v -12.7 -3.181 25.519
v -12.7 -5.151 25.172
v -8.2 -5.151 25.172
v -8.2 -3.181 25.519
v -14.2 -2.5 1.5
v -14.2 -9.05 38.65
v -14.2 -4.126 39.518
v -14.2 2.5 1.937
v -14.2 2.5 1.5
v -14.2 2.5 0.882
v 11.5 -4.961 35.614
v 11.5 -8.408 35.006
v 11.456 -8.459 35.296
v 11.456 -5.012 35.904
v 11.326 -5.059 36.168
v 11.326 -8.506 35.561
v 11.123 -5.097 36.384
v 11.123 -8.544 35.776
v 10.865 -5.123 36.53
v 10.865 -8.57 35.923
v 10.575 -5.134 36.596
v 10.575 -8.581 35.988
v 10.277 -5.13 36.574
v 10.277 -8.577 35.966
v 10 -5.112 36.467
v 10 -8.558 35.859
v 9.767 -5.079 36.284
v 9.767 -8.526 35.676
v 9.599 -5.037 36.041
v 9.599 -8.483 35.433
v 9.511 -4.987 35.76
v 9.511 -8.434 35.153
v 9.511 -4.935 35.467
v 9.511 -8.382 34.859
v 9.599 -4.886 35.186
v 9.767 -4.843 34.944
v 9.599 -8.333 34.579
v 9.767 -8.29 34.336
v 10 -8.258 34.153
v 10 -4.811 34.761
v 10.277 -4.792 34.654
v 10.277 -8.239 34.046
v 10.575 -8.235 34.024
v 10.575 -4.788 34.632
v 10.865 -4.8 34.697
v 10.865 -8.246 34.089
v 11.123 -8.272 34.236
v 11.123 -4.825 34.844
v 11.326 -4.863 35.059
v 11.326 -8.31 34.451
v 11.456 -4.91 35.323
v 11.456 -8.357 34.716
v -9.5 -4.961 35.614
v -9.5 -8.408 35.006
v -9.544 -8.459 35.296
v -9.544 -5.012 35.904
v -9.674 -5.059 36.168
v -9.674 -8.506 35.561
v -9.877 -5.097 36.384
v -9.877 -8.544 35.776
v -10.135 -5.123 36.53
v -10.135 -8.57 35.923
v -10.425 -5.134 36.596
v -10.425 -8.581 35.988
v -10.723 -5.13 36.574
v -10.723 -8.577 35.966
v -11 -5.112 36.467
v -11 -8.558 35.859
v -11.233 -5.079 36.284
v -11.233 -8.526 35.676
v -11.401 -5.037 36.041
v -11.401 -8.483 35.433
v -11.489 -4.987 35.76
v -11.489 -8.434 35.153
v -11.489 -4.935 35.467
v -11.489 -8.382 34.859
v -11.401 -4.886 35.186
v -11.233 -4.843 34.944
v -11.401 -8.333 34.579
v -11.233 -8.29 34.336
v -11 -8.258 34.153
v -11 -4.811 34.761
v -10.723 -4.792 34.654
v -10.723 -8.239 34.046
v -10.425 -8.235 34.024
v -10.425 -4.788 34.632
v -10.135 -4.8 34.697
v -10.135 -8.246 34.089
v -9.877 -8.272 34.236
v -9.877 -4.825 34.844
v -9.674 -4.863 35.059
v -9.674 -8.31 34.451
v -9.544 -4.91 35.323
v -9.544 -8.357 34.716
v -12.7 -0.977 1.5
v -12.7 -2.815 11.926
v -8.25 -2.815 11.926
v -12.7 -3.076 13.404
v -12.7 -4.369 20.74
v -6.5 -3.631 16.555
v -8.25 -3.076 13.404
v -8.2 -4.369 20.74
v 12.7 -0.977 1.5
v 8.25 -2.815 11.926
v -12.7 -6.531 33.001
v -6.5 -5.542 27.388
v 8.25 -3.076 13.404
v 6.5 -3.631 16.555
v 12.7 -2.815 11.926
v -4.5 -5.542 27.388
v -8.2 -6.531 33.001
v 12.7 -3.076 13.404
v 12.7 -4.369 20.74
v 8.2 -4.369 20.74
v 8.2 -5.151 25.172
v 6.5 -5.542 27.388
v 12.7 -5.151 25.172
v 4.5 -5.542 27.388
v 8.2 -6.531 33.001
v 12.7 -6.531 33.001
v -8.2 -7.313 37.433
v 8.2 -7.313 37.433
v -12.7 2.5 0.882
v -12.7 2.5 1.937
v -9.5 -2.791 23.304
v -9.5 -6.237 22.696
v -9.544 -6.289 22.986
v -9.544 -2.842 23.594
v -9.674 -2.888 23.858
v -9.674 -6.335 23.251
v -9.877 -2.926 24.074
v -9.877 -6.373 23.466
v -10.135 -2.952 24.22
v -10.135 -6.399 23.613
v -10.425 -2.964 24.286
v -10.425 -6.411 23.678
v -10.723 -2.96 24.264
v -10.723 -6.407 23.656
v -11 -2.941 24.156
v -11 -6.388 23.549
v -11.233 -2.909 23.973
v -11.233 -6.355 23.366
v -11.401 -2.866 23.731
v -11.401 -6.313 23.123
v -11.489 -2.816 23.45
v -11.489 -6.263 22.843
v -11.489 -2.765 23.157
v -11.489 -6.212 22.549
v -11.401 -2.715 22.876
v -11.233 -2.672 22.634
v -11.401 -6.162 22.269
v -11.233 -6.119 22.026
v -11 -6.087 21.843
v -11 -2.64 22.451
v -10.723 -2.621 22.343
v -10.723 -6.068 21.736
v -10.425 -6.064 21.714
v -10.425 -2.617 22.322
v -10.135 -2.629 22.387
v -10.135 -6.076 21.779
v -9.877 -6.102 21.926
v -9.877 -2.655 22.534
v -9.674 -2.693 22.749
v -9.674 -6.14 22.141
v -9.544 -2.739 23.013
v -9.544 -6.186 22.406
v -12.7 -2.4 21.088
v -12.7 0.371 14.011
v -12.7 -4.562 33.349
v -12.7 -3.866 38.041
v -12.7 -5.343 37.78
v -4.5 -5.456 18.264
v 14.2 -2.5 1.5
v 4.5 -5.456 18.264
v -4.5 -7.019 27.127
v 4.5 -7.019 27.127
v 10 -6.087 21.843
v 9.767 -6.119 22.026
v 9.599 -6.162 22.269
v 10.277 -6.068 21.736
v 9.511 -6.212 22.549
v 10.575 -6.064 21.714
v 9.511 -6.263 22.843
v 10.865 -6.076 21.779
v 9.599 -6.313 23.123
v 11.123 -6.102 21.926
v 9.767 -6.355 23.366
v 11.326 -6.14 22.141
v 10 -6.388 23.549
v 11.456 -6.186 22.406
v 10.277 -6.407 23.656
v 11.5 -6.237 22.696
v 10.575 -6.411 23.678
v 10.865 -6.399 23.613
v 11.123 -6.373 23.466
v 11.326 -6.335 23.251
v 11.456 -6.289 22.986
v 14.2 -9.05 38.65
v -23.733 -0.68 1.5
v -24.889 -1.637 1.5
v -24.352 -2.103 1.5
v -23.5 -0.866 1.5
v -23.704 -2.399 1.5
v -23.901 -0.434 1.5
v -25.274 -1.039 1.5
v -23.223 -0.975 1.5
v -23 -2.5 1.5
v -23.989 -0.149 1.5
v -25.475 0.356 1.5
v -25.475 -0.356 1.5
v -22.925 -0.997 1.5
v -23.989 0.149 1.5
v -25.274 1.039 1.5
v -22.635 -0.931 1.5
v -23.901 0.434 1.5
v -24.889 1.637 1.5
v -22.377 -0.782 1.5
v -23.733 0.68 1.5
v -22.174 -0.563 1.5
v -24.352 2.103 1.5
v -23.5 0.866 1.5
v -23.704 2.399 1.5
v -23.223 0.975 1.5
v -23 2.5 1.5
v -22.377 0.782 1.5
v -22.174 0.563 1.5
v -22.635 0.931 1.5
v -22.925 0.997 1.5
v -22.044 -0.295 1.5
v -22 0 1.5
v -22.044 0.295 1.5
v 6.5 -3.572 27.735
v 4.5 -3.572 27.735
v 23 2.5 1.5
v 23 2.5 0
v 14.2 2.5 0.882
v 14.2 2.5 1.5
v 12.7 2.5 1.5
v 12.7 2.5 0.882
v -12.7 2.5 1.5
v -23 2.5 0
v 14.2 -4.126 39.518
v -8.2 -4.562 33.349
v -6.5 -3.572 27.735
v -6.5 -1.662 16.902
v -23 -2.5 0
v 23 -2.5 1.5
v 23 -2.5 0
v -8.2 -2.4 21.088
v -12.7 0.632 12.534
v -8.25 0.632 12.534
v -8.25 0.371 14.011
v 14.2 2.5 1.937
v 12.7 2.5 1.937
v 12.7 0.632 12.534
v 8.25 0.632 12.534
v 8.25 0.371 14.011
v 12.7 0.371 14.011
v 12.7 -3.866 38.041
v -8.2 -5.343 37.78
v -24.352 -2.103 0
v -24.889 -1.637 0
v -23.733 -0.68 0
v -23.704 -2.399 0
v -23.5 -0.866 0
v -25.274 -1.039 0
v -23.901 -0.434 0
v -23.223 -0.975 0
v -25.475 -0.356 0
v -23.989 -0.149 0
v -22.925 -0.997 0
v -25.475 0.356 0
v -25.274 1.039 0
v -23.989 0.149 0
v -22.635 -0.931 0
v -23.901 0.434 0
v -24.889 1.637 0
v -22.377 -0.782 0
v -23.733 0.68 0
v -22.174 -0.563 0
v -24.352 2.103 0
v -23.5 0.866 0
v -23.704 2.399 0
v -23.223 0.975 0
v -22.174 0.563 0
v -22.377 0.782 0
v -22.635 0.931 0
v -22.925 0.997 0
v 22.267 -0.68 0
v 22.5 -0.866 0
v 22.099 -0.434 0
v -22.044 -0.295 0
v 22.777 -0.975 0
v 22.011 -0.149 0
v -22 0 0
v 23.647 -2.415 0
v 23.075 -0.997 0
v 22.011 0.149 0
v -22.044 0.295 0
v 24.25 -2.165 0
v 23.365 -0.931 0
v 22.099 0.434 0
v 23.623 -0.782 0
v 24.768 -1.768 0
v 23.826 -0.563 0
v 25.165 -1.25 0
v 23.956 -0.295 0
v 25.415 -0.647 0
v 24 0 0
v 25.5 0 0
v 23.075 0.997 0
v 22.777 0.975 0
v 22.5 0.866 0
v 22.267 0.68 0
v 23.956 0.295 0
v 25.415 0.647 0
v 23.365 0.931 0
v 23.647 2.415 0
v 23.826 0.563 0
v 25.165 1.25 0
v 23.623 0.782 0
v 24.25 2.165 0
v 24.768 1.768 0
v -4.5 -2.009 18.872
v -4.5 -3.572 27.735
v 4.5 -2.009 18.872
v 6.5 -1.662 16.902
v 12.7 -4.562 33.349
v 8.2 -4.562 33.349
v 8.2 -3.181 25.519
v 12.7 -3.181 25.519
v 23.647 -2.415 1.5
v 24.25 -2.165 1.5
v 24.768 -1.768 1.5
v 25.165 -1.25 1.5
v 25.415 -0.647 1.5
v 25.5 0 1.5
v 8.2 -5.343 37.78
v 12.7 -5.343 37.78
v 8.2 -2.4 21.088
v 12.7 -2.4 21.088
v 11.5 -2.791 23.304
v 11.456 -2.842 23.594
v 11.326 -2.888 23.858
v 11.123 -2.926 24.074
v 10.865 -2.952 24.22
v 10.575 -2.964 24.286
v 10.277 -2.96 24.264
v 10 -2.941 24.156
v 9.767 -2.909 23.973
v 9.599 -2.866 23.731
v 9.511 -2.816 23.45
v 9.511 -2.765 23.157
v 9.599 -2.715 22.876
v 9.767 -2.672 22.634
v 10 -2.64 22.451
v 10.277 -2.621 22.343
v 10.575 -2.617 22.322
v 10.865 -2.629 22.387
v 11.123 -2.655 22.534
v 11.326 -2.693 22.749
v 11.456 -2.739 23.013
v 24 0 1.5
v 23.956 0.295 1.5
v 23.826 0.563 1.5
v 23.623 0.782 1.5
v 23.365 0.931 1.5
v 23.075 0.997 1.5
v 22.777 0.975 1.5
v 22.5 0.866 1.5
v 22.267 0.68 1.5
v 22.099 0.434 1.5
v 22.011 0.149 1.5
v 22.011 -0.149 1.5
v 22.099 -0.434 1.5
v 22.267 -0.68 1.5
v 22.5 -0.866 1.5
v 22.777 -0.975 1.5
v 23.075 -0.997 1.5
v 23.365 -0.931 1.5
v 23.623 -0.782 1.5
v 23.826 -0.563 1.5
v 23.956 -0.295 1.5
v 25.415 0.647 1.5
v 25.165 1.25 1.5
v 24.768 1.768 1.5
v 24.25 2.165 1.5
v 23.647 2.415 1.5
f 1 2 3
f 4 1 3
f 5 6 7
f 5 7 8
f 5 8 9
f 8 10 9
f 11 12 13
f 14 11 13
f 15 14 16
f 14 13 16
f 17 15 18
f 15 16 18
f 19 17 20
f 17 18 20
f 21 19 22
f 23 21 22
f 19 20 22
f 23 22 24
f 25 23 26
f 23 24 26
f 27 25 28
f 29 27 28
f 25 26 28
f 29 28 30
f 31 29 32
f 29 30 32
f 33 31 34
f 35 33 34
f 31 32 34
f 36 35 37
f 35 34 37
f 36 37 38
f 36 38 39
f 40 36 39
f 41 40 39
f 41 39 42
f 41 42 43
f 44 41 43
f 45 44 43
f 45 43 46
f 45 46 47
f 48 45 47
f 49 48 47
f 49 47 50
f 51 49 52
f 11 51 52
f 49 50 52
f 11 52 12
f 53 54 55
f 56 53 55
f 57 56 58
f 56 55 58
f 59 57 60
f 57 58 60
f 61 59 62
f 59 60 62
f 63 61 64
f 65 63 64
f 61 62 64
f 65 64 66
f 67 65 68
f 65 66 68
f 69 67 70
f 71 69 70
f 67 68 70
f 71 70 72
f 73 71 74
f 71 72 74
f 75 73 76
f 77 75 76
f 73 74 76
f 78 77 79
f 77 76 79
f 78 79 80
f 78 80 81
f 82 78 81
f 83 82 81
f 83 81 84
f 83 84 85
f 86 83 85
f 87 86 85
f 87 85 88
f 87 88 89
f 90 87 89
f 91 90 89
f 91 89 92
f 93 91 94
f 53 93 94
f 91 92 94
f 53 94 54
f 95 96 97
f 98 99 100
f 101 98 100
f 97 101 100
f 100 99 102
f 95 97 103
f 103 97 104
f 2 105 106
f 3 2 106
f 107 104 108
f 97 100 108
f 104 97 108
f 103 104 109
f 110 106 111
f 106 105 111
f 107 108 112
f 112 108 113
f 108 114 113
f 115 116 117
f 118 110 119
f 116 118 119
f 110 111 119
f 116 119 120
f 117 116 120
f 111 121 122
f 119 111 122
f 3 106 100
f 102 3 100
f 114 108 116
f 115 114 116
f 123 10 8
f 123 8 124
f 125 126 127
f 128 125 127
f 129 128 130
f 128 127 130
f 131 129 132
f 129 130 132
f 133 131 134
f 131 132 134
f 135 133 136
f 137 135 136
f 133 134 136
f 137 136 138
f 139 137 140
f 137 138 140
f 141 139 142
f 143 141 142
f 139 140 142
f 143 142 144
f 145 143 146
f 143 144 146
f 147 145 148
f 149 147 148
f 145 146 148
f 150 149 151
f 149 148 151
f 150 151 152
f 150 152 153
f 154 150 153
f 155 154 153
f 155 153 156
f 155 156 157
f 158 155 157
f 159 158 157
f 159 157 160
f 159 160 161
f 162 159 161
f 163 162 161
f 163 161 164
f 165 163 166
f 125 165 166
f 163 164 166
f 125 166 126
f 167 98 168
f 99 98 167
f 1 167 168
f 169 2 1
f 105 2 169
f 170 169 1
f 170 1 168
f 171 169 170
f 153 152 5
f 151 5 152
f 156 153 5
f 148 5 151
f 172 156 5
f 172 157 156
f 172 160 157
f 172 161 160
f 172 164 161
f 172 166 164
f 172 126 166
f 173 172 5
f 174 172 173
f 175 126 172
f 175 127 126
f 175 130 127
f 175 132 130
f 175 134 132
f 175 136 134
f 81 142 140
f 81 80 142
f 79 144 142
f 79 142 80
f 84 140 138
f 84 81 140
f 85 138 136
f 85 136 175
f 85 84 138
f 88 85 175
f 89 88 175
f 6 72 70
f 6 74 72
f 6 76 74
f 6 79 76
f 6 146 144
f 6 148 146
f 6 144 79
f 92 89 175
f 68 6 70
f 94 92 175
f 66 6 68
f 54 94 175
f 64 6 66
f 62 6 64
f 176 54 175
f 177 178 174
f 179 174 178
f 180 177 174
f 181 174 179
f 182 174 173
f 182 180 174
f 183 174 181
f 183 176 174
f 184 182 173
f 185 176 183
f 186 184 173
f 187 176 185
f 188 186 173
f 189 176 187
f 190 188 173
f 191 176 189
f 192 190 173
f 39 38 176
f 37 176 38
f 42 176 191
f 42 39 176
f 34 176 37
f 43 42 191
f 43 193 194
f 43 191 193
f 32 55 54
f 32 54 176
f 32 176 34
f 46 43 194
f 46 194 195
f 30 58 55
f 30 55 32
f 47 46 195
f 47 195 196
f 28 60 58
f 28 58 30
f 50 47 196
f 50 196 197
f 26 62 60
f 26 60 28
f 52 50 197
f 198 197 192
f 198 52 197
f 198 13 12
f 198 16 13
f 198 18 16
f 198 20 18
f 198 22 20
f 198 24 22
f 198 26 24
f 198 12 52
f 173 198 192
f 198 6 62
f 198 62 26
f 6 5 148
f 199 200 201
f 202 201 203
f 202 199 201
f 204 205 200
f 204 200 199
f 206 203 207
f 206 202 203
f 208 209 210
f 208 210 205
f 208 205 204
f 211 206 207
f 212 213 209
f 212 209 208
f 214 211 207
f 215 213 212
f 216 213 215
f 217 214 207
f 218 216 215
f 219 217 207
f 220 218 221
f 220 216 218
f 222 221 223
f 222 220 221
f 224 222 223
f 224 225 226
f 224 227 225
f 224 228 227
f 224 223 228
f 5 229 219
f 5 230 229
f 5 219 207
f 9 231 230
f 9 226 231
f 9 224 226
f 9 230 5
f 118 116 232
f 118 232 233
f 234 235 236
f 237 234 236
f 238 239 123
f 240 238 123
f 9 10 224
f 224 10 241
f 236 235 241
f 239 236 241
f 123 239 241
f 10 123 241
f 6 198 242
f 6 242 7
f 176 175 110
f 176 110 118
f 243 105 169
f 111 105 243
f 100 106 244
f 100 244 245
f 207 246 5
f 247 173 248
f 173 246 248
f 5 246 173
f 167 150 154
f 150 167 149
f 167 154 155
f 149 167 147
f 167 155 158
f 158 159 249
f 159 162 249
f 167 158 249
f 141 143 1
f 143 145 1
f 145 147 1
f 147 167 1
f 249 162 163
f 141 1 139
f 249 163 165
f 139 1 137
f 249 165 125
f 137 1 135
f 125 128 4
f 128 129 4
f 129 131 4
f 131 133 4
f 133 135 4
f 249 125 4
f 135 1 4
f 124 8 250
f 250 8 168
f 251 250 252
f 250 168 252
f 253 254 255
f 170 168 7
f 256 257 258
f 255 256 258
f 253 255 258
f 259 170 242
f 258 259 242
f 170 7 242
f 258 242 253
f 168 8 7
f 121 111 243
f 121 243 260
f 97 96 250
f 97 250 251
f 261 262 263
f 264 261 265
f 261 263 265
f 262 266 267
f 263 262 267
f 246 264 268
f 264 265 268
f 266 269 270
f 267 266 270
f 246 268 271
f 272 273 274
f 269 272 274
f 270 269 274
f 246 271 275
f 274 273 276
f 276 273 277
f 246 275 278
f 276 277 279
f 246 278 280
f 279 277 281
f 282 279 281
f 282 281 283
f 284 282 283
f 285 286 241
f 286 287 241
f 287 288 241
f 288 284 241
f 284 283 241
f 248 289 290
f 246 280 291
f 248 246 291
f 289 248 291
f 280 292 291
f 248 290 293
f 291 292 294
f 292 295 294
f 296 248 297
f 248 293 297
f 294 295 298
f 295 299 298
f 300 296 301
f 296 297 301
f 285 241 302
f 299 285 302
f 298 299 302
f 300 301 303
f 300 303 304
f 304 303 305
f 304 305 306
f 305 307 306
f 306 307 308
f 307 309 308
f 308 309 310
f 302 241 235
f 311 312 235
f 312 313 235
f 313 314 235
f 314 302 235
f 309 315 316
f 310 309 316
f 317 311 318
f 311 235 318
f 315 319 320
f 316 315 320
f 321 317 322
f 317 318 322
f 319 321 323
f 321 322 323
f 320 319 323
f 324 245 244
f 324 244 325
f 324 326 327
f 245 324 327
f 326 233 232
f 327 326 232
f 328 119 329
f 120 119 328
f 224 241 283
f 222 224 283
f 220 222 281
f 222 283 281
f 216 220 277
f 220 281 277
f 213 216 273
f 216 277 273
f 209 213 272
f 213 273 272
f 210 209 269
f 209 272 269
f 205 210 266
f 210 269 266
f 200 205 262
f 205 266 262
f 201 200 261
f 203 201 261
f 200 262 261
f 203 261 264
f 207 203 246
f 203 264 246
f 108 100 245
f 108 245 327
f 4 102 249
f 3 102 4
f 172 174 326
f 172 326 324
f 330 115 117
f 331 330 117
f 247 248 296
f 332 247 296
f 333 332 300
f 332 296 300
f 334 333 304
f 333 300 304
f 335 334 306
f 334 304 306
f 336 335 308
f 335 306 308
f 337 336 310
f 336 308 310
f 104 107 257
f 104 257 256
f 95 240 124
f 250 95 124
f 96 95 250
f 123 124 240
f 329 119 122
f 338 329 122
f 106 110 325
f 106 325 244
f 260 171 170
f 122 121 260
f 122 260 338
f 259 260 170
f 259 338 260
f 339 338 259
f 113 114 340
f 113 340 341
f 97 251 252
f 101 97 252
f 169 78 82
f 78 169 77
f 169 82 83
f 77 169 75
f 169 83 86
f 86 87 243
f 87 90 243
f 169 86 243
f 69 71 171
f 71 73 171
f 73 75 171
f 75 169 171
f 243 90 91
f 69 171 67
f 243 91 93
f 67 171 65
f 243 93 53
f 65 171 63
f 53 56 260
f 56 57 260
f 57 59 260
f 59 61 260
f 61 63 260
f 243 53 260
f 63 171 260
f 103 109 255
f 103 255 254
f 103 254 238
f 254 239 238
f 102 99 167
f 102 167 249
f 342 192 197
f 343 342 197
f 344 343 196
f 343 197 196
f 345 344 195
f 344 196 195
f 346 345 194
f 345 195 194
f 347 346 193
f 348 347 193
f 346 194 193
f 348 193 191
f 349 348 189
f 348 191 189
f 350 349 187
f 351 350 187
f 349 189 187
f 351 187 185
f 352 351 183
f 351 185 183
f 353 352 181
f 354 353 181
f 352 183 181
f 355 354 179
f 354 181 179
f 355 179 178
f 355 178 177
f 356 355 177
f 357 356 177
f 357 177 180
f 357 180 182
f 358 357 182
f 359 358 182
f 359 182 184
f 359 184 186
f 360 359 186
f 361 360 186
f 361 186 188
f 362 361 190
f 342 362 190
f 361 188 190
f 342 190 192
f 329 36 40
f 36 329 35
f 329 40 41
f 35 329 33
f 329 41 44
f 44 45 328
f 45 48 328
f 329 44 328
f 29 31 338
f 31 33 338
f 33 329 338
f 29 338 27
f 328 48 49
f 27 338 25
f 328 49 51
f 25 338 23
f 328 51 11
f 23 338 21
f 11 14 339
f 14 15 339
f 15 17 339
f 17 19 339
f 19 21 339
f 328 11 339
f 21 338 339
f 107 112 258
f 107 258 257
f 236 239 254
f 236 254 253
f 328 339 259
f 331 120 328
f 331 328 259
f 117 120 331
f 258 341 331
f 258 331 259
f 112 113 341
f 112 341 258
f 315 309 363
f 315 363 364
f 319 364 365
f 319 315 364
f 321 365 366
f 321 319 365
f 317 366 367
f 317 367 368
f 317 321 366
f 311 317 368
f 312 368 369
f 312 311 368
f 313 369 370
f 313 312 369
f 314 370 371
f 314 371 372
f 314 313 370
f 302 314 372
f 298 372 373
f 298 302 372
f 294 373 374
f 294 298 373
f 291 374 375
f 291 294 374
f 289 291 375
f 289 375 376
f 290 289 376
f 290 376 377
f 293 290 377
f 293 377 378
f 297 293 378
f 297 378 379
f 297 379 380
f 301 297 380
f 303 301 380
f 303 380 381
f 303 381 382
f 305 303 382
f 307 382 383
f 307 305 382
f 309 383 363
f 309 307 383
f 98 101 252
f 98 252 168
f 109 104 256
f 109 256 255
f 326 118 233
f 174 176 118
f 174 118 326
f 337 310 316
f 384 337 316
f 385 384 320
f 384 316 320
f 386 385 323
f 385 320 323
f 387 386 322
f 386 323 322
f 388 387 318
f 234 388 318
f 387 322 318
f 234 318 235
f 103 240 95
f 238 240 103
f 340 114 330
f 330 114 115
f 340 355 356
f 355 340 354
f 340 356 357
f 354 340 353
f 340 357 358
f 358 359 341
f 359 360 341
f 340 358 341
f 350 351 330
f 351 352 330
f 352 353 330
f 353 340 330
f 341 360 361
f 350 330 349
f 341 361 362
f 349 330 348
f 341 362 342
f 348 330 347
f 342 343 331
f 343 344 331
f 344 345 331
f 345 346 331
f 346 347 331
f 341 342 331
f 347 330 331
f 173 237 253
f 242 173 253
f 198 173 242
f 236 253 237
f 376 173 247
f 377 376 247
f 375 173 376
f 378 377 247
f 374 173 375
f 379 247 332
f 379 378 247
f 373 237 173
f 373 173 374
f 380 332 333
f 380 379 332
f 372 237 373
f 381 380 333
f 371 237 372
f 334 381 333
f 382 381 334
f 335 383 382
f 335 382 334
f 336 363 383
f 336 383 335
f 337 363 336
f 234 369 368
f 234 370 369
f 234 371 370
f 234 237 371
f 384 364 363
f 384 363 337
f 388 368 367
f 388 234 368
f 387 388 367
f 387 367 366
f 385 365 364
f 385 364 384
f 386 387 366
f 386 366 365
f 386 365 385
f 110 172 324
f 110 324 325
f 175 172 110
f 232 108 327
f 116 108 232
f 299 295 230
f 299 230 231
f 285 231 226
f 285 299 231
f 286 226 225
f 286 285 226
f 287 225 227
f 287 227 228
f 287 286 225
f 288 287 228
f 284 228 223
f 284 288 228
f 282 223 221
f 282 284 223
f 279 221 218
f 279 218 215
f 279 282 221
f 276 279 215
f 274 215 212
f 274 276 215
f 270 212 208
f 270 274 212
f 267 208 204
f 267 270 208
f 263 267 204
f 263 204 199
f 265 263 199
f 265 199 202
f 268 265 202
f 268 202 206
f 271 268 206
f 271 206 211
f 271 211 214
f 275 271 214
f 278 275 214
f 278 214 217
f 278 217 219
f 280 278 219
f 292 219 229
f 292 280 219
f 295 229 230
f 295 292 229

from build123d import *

# Parameters (mm, degrees)
F0_R     = 1
F1_DEPTH = 1.5
F4_DEPTH = 1.5
F5_DEPTH = 5
F3_W     = 4.5
F3_H     = 4.5
F3_R     = 1
F6_DEPTH = 3.5
F7_W     = 32.583123
F7_H     = 2.642157
F8_DEPTH = 14.8


with BuildPart() as f1:
    # F0 (on Top) → F1 (new body)
    with BuildSketch(Plane.XY):
        with BuildLine():
            ThreePointArc((-20.5, 0), (-21.232233, 1.767767), (-23, 2.5))
            ThreePointArc((-23, 2.5), (-25.5, 0), (-23, -2.5))
            ThreePointArc((-23, -2.5), (-21.232233, -1.767767), (-20.5, 0))
        make_face()
        with Locations((-23, 0)):
            Circle(F0_R, mode=Mode.SUBTRACT)
        with BuildLine():
            Line((23, 2.5), (-23, 2.5))
            ThreePointArc((-23, 2.5), (-21.232233, 1.767767), (-20.5, 0))
            ThreePointArc((-20.5, 0), (-21.232233, -1.767767), (-23, -2.5))
            Line((-23, -2.5), (23, -2.5))
            ThreePointArc((23, -2.5), (20.5, 0), (23, 2.5))
        make_face()
        with BuildLine():
            ThreePointArc((25.5, 0), (24.767767, 1.767767), (23, 2.5))
            ThreePointArc((23, 2.5), (20.5, 0), (23, -2.5))
            ThreePointArc((23, -2.5), (24.767767, -1.767767), (25.5, 0))
        make_face()
        with Locations((23, 0)):
            Circle(F0_R, mode=Mode.SUBTRACT)
    extrude(amount=F1_DEPTH)

    # F3 (on face) → F4 (join)
    with BuildSketch(Plane(origin=(0, -2.168101, -0.382295), x_dir=(1, 0, 0), z_dir=(0, -0.984808, -0.173648))):
        Polygon((8.2, 38.13412), (-8.2, 38.13412), (-8.2, 33.63412), (-12.7, 33.63412), (-12.7, 25.68412), (-8.2, 25.68412), (-8.2, 21.18412), (-12.7, 21.18412), (-12.7, 13.73412), (-8.25, 13.73412), (-8.25, 12.23412), (-12.7, 12.23412), (-12.7, 0.43412), (12.7, 0.43412), (12.7, 12.23412), (8.25, 12.23412), (8.25, 13.73412), (12.7, 13.73412), (12.7, 21.18412), (8.2, 21.18412), (8.2, 25.68412), (12.7, 25.68412), (12.7, 33.63412), (8.2, 33.63412), align=None)
        Polygon((-6.5, 27.93412), (-4.5, 27.93412), (4.5, 27.93412), (6.5, 27.93412), (6.5, 16.93412), (-6.5, 16.93412), align=None, mode=Mode.SUBTRACT)
    extrude(amount=-F4_DEPTH)

    # F3 (on face) → F5 (join)
    with BuildSketch(Plane(origin=(0, -2.168101, -0.382295), x_dir=(1, 0, 0), z_dir=(0, -0.984808, -0.173648))):
        Polygon((-12.7, 33.63412), (-12.7, 38.13412), (-8.2, 38.13412), (8.2, 38.13412), (12.7, 38.13412), (12.7, 33.63412), (12.7, 25.68412), (12.7, 21.18412), (12.7, 13.73412), (8.25, 13.73412), (8.25, 12.23412), (12.7, 12.23412), (12.7, 0.43412), (14.2, 0.43412), (14.2, 39.63412), (-14.2, 39.63412), (-14.2, 0.43412), (-12.7, 0.43412), (-12.7, 12.23412), (-8.25, 12.23412), (-8.25, 13.73412), (-12.7, 13.73412), (-12.7, 21.18412), (-12.7, 25.68412), align=None)
    extrude(amount=-F5_DEPTH)

    # F3 (on face) → F6 (join)
    with BuildSketch(Plane(origin=(0, -2.168101, -0.382295), x_dir=(1, 0, 0), z_dir=(0, -0.984808, -0.173648))):
        with Locations((-10.45, 35.88412)):
            Rectangle(F3_W, F3_H)
        with Locations((-10.5, 35.93412)):
            Circle(F3_R, mode=Mode.SUBTRACT)
        with Locations((10.45, 35.88412)):
            Rectangle(F3_W, F3_H)
        with Locations((10.5, 35.93412)):
            Circle(F3_R, mode=Mode.SUBTRACT)
        with Locations((10.45, 23.43412)):
            Rectangle(F3_W, F3_H)
        with Locations((10.5, 23.43412)):
            Circle(F3_R, mode=Mode.SUBTRACT)
        with Locations((-10.45, 23.43412)):
            Rectangle(F3_W, F3_H)
        with Locations((-10.5, 23.43412)):
            Circle(F3_R, mode=Mode.SUBTRACT)
        Polygon((-4.5, 18.93412), (-4.5, 27.93412), (-6.5, 27.93412), (-6.5, 16.93412), (6.5, 16.93412), (6.5, 27.93412), (4.5, 27.93412), (4.5, 18.93412), align=None)
    extrude(amount=-F6_DEPTH)

    # F7 (on face) → F8 (cut)
    with BuildSketch(Plane(origin=(0, 0, 0), x_dir=(1, 0, 0), z_dir=(0, 0, -1))):
        with Locations((-0.506625, -3.821079)):
            Rectangle(F7_W, F7_H)
    extrude(amount=-F8_DEPTH, mode=Mode.SUBTRACT)


solid = f1.part
